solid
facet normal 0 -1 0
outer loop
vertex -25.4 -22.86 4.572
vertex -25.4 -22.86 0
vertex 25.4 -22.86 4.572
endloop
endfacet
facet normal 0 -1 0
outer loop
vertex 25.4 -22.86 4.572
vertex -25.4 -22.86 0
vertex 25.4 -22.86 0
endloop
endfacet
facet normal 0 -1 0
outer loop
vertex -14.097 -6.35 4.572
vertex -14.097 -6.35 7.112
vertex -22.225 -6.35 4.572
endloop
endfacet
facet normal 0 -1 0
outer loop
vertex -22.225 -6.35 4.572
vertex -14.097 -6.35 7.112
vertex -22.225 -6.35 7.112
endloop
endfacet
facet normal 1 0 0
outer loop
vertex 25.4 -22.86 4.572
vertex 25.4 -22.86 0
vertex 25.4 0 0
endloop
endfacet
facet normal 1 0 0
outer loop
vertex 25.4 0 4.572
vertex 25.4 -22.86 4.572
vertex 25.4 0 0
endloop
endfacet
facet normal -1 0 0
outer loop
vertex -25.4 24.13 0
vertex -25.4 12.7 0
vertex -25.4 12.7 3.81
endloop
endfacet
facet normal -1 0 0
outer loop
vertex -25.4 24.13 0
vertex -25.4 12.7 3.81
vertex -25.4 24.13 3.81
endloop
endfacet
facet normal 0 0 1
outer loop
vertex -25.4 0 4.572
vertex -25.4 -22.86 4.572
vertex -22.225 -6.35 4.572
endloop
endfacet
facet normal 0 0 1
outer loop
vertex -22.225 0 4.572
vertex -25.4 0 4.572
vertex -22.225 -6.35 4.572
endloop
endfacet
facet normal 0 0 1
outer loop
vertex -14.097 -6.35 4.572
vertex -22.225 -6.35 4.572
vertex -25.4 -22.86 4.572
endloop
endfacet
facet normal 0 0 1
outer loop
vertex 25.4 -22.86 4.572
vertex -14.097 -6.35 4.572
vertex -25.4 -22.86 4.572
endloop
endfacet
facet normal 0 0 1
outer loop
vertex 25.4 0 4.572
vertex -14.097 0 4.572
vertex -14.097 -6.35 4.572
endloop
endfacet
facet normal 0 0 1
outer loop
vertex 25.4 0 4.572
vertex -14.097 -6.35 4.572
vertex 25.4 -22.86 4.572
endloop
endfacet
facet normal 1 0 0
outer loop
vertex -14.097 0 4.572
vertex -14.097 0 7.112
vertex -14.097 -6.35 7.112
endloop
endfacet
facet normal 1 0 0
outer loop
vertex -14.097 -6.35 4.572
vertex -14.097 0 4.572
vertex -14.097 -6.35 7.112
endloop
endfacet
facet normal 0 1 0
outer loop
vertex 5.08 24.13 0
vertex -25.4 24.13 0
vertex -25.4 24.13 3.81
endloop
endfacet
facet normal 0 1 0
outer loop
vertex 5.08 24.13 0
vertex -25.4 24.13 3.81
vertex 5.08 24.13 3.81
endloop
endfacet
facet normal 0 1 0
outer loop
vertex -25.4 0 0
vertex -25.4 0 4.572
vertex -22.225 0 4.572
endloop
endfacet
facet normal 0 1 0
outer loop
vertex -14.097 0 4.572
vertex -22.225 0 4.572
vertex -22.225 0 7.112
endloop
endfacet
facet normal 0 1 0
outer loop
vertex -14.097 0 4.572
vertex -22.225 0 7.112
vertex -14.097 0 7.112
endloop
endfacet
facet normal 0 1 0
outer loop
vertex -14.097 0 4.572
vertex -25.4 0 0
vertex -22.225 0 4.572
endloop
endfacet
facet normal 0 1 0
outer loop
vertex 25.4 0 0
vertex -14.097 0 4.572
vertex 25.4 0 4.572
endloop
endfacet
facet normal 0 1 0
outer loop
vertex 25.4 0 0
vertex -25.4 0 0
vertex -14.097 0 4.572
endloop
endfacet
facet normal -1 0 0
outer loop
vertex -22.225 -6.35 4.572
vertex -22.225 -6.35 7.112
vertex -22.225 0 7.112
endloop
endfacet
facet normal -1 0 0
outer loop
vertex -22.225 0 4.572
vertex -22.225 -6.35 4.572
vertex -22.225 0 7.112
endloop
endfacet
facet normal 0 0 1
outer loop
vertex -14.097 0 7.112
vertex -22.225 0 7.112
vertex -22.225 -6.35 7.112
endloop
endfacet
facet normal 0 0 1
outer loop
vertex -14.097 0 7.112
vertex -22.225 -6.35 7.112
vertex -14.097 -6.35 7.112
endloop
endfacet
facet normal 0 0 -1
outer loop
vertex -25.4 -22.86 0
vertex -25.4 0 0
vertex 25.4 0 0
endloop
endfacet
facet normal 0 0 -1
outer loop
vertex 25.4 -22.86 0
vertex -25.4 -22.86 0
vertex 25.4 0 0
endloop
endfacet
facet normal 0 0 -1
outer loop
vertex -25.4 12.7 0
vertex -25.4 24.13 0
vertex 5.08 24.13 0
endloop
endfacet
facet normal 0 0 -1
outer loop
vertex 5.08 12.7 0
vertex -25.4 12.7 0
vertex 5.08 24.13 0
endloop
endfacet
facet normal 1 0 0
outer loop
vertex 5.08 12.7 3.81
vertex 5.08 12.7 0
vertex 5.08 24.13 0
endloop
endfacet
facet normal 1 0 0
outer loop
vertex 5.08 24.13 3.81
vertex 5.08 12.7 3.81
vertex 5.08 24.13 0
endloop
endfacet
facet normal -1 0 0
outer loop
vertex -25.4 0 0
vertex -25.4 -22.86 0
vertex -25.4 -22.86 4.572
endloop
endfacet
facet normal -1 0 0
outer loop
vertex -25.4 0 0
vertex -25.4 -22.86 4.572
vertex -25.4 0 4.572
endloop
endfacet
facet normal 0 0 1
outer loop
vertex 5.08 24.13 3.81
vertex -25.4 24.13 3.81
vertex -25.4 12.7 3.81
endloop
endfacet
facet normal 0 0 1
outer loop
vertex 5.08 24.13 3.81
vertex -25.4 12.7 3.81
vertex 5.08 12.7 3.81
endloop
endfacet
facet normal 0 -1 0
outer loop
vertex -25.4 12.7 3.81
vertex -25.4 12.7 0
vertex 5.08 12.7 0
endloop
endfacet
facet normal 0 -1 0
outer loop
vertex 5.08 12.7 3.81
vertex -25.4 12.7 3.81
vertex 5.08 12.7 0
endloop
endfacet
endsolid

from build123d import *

# Parameters (mm, degrees)
F0_W     = 50.8
F0_H     = 22.86
F1_DEPTH = 7.112
F4_W     = 30.48
F4_H     = 11.43
F5_DEPTH = 3.81
F7_DEPTH = 2.54


with BuildPart() as f1:
    # F0 (on Top) → F1 (new body)
    with BuildSketch(Plane.XY):
        with Locations((0, -11.43)):
            Rectangle(F0_W, F0_H)
    extrude(amount=F1_DEPTH)

    # F2 (on face) → F7 (cut)
    with BuildSketch(Plane.XY.offset(7.112)):
        Polygon((-22.225, -6.35), (-22.225, 0), (-25.4, 0), (-25.4, -22.86), (25.4, -22.86), (25.4, 0), (-14.097, 0), (-14.097, -6.35), align=None)
    extrude(amount=-F7_DEPTH, mode=Mode.SUBTRACT)


with BuildPart() as f5:
    # F4 (on face) → F5 (new body)
    with BuildSketch(Plane.XY):
        with Locations((-10.16, 18.415)):
            Rectangle(F4_W, F4_H)
    extrude(amount=F5_DEPTH)


solid = Compound([f1.part, f5.part])
